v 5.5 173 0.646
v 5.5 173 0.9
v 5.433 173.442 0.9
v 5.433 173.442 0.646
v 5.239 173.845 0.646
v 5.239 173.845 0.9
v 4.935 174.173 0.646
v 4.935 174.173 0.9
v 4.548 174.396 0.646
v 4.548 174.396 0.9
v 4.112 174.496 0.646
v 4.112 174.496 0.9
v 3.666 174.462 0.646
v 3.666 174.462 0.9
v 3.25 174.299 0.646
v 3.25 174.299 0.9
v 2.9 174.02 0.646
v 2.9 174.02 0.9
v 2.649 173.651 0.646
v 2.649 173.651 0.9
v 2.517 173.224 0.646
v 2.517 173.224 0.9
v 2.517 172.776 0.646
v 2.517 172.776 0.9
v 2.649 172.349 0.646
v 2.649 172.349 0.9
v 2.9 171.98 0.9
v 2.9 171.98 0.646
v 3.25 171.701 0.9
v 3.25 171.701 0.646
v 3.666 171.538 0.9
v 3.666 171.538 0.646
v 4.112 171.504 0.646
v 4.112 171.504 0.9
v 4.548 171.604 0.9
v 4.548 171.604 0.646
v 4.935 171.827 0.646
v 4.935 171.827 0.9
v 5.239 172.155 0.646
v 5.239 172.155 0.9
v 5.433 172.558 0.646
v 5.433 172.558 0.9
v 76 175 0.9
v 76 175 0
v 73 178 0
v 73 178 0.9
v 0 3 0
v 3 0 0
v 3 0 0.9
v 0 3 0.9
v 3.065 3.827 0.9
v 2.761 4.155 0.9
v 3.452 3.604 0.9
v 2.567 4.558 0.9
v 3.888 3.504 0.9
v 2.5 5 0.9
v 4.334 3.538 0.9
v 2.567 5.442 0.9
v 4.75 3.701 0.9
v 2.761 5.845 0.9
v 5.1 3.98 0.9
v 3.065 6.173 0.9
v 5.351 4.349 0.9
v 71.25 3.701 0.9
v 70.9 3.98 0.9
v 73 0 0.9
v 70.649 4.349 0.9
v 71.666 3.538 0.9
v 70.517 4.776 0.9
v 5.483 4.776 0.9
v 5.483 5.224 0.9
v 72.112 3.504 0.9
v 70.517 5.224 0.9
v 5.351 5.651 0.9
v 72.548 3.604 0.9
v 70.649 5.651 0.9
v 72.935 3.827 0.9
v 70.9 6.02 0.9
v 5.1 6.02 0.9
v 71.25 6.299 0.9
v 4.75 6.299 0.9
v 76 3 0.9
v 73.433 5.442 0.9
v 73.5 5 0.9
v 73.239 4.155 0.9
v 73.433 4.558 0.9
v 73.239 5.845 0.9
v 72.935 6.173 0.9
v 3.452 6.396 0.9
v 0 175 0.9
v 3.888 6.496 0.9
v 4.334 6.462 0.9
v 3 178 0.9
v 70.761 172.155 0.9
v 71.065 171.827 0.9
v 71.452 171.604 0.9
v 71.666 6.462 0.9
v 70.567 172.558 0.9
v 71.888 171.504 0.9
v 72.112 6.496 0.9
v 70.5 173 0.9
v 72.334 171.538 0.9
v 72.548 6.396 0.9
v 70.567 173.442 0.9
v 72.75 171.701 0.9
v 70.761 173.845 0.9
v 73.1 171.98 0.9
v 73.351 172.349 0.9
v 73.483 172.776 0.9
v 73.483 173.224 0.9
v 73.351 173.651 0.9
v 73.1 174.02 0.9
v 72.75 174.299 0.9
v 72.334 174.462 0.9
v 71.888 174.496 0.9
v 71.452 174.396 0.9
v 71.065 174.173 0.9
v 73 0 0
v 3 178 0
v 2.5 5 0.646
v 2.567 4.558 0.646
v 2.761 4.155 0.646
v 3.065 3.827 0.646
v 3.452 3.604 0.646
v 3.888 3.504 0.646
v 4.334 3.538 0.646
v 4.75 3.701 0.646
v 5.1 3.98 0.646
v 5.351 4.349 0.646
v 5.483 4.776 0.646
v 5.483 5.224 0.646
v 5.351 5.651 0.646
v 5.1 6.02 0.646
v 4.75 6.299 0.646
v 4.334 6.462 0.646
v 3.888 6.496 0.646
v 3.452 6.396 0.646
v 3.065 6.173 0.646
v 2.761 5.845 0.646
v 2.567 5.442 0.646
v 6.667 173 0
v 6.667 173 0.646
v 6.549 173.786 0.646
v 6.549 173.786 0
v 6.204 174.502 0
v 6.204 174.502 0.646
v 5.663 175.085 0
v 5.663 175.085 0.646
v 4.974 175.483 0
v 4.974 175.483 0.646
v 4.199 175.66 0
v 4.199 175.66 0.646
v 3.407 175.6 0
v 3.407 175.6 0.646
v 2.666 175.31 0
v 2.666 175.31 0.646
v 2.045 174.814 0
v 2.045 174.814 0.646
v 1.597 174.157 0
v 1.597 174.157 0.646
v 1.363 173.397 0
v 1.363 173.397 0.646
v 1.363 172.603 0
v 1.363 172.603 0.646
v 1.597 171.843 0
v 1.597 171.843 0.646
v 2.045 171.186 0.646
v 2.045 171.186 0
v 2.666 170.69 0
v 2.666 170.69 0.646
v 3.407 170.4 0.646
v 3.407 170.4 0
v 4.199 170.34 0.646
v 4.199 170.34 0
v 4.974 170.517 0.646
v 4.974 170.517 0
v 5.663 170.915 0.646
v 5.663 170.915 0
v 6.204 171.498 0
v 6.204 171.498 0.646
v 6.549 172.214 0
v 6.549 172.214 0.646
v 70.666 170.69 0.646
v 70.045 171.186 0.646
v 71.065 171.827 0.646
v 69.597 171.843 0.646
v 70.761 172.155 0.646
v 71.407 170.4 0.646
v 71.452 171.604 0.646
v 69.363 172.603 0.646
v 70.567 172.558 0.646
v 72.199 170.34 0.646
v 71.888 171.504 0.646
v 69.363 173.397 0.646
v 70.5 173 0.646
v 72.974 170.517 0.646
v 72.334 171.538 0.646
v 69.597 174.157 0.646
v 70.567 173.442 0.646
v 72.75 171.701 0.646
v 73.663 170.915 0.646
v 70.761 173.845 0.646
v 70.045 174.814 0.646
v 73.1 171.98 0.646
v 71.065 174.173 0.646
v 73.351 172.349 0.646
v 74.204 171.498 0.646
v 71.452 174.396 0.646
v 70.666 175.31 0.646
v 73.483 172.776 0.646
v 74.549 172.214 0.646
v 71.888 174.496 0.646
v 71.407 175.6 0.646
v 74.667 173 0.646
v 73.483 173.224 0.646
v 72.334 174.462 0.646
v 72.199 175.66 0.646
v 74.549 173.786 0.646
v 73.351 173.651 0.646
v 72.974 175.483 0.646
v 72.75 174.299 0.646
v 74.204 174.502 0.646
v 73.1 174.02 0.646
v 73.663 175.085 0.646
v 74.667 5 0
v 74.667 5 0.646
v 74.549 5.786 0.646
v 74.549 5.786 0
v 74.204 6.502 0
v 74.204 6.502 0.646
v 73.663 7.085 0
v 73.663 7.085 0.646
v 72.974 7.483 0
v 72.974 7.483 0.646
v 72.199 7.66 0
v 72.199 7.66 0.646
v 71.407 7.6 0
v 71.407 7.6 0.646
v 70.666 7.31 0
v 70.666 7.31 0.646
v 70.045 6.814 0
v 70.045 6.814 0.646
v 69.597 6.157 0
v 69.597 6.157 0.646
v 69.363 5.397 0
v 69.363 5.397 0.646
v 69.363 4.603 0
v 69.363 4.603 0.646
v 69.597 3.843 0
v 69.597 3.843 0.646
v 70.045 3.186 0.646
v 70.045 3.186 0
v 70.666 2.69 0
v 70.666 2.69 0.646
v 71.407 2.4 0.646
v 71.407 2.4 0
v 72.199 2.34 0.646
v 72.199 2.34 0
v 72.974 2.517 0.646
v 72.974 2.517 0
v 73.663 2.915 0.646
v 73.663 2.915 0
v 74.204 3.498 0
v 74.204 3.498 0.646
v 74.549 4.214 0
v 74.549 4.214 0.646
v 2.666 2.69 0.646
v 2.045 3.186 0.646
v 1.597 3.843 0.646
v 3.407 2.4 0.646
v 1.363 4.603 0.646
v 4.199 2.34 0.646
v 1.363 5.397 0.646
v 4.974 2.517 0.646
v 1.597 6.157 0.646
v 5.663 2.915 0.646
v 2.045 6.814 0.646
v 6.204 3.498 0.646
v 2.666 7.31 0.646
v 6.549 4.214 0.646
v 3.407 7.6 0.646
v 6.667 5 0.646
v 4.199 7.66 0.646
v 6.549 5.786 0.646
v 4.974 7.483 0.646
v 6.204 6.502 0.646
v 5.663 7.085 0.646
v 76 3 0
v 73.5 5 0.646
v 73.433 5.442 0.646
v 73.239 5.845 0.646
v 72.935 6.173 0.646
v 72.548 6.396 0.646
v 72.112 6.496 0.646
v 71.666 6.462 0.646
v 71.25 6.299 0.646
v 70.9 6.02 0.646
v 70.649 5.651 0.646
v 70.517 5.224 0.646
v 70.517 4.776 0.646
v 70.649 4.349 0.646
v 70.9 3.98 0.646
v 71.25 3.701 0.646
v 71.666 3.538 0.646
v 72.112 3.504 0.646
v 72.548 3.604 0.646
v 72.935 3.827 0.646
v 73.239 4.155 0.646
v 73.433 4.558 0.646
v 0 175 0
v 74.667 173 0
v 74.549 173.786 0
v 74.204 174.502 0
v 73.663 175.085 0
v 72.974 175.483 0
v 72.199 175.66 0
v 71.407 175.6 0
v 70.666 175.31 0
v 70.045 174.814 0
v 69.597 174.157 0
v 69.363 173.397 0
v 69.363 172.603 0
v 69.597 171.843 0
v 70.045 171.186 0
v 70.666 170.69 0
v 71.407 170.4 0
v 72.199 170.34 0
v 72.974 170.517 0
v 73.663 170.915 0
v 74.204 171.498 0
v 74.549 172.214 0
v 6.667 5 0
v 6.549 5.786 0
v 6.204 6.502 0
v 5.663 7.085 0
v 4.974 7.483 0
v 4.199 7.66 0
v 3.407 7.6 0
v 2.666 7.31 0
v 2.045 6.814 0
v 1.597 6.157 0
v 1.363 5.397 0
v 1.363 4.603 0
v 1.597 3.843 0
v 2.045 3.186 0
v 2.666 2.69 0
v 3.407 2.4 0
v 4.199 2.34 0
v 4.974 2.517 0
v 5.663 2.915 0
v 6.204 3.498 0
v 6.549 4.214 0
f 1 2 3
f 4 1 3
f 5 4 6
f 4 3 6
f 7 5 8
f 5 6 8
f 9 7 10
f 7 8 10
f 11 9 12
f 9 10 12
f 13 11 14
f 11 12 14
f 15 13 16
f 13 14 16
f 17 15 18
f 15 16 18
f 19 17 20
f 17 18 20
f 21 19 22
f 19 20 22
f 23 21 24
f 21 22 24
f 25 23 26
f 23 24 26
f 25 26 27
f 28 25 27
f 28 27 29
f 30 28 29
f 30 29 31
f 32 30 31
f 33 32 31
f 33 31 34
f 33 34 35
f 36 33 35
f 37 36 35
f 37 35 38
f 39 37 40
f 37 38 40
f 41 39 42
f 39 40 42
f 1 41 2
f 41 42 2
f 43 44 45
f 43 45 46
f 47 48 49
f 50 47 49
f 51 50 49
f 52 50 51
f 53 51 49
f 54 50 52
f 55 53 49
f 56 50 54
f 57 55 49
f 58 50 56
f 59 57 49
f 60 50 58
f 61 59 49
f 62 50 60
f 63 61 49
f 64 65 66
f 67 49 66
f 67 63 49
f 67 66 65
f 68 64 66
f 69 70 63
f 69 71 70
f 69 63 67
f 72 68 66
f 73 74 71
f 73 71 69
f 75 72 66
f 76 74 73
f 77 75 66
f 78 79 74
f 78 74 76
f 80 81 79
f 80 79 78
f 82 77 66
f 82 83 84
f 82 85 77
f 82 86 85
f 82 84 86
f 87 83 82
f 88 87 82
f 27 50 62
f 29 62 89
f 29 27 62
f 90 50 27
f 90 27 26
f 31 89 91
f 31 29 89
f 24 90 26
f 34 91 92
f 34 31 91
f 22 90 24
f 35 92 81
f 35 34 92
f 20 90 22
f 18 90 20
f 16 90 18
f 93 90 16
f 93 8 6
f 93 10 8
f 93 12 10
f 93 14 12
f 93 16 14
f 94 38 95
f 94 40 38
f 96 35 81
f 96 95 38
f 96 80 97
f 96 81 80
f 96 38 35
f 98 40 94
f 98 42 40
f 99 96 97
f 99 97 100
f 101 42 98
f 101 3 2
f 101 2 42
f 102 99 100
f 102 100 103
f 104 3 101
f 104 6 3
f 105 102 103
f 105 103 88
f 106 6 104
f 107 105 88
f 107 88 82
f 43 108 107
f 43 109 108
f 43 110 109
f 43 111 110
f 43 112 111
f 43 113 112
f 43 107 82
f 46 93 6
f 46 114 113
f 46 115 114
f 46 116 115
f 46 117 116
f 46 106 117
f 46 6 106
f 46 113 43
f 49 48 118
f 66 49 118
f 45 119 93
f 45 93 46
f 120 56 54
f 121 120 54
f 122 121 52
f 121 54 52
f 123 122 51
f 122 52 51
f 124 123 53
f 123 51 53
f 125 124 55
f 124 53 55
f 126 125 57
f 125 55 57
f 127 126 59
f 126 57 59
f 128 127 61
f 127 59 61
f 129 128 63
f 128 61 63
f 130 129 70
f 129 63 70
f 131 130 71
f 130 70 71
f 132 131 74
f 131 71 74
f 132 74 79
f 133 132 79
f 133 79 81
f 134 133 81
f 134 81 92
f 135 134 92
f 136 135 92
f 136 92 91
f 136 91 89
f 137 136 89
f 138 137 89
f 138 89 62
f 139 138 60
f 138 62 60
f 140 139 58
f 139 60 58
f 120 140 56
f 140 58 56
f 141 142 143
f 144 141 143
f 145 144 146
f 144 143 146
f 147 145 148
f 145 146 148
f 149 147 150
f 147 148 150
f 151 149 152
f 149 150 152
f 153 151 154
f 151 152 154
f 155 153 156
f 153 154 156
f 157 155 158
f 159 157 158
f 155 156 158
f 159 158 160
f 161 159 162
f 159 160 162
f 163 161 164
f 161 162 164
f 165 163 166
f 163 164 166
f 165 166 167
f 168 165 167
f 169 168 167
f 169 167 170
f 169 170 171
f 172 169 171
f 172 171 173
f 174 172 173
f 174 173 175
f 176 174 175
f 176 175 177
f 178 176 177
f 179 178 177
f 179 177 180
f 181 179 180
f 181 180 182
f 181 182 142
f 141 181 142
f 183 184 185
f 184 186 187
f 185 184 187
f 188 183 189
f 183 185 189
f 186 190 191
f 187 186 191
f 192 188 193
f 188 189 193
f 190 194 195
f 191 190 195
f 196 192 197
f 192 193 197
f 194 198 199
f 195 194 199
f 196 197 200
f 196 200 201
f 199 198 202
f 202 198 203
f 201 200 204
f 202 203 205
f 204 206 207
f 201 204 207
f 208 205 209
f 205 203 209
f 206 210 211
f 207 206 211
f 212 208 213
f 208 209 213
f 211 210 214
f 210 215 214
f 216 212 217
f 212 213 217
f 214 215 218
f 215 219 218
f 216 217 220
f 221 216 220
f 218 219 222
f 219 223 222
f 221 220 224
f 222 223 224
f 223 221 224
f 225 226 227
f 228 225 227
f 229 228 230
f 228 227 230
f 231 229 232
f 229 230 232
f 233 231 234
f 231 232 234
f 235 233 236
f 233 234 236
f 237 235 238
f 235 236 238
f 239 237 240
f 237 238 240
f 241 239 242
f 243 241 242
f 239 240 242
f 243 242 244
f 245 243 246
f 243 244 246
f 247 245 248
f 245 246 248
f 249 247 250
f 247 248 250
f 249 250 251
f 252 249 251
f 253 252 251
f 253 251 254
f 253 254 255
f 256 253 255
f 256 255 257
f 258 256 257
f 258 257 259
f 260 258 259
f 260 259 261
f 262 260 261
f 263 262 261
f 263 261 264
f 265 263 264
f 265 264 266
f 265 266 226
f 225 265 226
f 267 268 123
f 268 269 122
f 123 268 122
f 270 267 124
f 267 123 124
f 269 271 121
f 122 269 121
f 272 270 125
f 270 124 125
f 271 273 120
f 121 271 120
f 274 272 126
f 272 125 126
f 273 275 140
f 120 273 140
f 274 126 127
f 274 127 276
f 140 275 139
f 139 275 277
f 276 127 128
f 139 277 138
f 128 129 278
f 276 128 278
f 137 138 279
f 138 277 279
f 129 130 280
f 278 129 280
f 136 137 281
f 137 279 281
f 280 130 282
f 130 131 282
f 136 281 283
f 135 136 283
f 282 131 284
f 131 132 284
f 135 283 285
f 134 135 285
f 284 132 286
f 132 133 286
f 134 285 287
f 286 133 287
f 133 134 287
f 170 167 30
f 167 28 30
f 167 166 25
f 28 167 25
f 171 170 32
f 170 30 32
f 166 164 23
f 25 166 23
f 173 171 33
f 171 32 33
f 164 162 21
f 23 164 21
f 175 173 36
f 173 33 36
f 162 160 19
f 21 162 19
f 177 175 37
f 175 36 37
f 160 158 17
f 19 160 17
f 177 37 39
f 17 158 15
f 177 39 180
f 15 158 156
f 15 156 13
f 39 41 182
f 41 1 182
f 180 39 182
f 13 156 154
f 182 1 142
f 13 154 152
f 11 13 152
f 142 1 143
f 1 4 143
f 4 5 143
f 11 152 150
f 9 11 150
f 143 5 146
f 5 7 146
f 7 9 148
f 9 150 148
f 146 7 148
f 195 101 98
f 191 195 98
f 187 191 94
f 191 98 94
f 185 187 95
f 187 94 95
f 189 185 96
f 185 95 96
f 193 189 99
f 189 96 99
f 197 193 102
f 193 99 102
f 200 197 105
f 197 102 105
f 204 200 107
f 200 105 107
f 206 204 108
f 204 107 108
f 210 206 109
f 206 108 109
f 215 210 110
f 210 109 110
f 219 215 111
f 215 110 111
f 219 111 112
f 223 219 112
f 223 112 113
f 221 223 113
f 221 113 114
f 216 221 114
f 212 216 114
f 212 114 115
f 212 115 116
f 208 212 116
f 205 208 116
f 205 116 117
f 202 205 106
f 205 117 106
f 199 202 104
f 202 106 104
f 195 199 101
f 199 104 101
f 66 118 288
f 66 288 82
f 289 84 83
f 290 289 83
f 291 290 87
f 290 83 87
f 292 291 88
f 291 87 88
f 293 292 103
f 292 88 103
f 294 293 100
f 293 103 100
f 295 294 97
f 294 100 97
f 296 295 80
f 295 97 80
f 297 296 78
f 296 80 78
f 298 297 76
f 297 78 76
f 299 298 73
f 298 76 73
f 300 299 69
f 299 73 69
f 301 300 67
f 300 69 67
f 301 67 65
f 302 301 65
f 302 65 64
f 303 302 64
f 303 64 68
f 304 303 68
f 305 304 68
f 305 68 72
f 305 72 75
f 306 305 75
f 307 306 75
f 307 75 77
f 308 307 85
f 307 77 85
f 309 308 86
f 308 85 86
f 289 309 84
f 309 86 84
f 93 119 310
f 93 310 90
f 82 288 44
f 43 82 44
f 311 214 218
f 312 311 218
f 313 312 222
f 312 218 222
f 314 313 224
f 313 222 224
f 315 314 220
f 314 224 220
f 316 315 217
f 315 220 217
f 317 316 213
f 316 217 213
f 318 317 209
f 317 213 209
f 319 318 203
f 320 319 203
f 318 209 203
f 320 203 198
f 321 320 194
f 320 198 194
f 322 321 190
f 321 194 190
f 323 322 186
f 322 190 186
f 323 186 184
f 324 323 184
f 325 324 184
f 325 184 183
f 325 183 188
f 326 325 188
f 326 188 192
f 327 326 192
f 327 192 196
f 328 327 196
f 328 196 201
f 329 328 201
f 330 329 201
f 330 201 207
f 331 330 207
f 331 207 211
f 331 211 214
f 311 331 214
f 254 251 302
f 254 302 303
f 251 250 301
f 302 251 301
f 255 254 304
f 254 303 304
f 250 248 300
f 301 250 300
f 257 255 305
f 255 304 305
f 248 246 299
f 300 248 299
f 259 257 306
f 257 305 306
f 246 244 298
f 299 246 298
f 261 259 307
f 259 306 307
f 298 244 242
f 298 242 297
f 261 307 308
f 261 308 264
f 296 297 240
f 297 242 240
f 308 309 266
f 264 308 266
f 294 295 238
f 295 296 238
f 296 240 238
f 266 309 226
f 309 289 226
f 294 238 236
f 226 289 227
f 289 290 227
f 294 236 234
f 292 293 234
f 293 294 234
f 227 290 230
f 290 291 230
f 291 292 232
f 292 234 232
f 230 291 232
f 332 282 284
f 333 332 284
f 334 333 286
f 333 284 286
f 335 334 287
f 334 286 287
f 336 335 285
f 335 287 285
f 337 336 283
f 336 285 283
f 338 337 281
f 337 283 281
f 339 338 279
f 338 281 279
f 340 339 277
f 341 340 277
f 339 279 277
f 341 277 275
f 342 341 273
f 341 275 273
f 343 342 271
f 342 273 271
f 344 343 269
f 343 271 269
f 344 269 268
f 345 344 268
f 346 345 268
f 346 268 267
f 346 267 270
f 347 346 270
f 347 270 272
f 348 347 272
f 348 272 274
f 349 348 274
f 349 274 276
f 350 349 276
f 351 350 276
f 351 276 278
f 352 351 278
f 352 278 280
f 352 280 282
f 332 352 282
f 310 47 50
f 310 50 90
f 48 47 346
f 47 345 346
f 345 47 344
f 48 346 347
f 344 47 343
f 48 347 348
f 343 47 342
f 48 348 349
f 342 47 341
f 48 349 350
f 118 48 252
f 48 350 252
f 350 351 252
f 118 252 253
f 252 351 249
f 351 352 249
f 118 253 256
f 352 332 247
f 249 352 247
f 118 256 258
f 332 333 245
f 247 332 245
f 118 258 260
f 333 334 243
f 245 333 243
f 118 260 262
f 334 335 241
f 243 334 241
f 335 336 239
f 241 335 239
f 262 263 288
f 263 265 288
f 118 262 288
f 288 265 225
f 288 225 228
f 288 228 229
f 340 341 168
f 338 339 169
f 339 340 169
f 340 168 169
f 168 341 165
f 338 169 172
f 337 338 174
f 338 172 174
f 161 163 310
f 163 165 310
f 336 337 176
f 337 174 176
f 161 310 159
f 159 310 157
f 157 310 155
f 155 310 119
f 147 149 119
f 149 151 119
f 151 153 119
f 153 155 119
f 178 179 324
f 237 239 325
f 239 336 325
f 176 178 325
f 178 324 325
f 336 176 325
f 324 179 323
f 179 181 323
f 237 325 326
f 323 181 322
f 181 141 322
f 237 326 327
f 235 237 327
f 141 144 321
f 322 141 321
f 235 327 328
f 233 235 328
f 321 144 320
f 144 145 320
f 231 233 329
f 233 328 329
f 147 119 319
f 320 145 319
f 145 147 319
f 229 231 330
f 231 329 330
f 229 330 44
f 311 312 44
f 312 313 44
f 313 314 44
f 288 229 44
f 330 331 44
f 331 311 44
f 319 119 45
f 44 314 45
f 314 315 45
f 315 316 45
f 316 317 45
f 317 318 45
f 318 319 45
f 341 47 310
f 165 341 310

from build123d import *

# Parameters (mm, degrees)
SKETCH2_W           = 76
SKETCH2_H           = 178
BOSS_EXTRUDE1_DEPTH = 0.9
SKETCH4_R           = 2.667
CUT_EXTRUDE1_DEPTH  = 2
SKETCH5_R           = 2.667
SKETCH5_R_2         = 1.5
BOSS_EXTRUDE2_DEPTH = 0.254
CHAMFER1_SIZE       = 3


with BuildPart() as part:
    # Sketch2 → Boss-Extrude1 (new body)
    with BuildSketch(Plane.XY):
        with Locations((38, 89)):
            Rectangle(SKETCH2_W, SKETCH2_H)
    extrude(amount=BOSS_EXTRUDE1_DEPTH)

    # Sketch4 → Cut-Extrude1 (cut)
    with BuildSketch(Plane.XY.offset(0.9)):
        with Locations((4, 173)):
            Circle(SKETCH4_R)
        with Locations((72, 173)):
            Circle(SKETCH4_R)
        with Locations((72, 5)):
            Circle(SKETCH4_R)
        with Locations((4, 5)):
            Circle(SKETCH4_R)
    extrude(amount=-CUT_EXTRUDE1_DEPTH, mode=Mode.SUBTRACT)

    # Sketch5 → Boss-Extrude2 (add)
    # profile 1 of 4: a face of its own
    with BuildSketch(Plane.XY.offset(0.9)):
        with Locations((4, 5)):
            Circle(SKETCH5_R)
        with Locations(Location((4, 5, 0), (0, 0, 180))):
            Circle(SKETCH5_R_2, mode=Mode.SUBTRACT)
    # profile 2 of 4: a face of its own
    with BuildSketch(Plane.XY.offset(0.9)):
        with Locations((4, 173)):
            Circle(SKETCH5_R)
        with Locations((4, 173)):
            Circle(SKETCH5_R_2, mode=Mode.SUBTRACT)
    # profile 3 of 4: a face of its own
    with BuildSketch(Plane.XY.offset(0.9)):
        with Locations((72, 5)):
            Circle(SKETCH5_R)
        with Locations((72, 5)):
            Circle(SKETCH5_R_2, mode=Mode.SUBTRACT)
    # profile 4 of 4: a face of its own
    with BuildSketch(Plane.XY.offset(0.9)):
        with Locations((72, 173)):
            Circle(SKETCH5_R)
        with Locations(Location((72, 173, 0), (0, 0, 180))):
            Circle(SKETCH5_R_2, mode=Mode.SUBTRACT)
    extrude(amount=-BOSS_EXTRUDE2_DEPTH)

    # Chamfer1
    chamfer1_edges = [part.edges().sort_by_distance(p)[0] for p in [
        (0, 178, 0.45),
        (76, 178, 0.45),
        (76, 0, 0.45),
        (0, 0, 0.45),
    ]]
    chamfer(chamfer1_edges, length=CHAMFER1_SIZE)


solid = part.part
